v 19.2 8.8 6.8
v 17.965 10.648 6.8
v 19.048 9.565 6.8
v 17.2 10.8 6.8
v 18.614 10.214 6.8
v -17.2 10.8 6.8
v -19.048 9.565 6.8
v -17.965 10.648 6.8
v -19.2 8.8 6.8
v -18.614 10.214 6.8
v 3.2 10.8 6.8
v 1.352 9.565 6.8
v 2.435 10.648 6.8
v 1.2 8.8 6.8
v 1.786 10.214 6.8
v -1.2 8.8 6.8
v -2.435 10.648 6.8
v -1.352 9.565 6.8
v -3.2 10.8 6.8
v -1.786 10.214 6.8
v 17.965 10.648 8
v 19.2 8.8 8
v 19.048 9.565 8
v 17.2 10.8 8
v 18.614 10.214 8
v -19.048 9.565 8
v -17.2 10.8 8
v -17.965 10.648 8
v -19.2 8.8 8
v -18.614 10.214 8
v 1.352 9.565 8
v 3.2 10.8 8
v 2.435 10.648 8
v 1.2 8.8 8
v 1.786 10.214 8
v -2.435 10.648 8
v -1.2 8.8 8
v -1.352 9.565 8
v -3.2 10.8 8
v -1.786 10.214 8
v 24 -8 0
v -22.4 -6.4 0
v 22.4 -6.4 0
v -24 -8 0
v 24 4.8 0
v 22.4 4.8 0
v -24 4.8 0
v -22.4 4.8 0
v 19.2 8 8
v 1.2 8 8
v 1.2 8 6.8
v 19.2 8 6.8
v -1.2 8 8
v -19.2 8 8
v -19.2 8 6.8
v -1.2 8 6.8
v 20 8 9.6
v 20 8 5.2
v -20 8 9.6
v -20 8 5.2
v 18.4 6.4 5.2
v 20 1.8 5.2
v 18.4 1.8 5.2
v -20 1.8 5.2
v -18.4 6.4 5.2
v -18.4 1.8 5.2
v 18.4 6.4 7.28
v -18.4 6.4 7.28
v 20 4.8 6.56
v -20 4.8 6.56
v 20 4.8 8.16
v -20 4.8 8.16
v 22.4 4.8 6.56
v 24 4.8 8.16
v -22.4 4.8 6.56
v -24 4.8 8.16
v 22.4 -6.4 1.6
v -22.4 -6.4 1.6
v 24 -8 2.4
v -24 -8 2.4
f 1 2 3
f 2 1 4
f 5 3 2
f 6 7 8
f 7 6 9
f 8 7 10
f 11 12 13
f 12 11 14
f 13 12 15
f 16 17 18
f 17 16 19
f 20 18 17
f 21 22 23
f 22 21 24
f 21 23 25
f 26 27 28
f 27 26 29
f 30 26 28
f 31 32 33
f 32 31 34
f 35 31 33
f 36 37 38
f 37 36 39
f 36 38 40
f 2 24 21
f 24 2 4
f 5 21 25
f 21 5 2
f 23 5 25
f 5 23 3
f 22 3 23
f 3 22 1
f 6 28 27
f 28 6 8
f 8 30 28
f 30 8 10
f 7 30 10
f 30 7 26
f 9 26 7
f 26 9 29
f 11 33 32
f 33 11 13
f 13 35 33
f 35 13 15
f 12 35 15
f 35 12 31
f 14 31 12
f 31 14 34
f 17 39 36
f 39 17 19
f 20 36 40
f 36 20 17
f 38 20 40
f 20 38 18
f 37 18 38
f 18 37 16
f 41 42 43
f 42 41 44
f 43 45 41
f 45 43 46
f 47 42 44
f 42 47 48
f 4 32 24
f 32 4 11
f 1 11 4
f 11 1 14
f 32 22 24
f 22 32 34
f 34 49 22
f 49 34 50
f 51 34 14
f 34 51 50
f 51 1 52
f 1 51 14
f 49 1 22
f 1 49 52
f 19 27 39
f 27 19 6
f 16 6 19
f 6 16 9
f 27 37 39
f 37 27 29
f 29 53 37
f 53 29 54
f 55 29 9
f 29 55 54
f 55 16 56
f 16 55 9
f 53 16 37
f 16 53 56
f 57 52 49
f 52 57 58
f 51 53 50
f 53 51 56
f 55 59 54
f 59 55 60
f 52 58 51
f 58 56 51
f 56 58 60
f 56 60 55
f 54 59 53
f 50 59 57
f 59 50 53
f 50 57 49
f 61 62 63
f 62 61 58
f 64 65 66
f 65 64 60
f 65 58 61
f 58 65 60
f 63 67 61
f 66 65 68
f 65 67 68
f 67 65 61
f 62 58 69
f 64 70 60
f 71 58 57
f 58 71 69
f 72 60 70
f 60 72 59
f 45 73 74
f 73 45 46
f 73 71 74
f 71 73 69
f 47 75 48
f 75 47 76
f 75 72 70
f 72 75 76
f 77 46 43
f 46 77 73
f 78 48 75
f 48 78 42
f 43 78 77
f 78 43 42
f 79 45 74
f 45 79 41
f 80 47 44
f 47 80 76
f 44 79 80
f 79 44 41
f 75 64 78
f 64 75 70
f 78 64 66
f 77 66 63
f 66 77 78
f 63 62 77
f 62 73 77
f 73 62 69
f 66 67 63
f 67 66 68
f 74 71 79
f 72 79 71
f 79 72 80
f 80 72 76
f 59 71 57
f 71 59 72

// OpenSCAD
// file: ../p/1-4edge.scad
use <../lib.scad>
function ldraw_lib__1_4edge() = [
// 0 Circle 0.25
// 0 Name: 1-4edge.dat
// 0 Author: James Jessiman
// 0 !LDRAW_ORG Primitive UPDATE 2017-01
// 0 !LICENSE Licensed under CC BY 2.0 and CC BY 4.0 : see CAreadme.txt
// 
// 0 BFC CERTIFY CCW
  [0,"BFC","CERTIFY"],
  [0,"BFC","CCW"],
// 
// 0 !HISTORY 2007-06-22 [PTadmin] Header formatted for Contributor Agreement
// 0 !HISTORY 2008-07-01 [PTadmin] Official Update 2008-01
// 0 !HISTORY 2017-01-15 [Steffen] BFCed
// 0 !HISTORY 2017-12-30 [PTadmin] Official Update 2017-01
// 
// 
// 2 24 1 0 0 0.9239 0 0.3827
  [2,24,1,0,0,0.9239,0,0.3827],
// 2 24 0.9239 0 0.3827 0.7071 0 0.7071
  [2,24,0.9239,0,0.3827,0.7071,0,0.7071],
// 2 24 0.7071 0 0.7071 0.3827 0 0.9239
  [2,24,0.7071,0,0.7071,0.3827,0,0.9239],
// 2 24 0.3827 0 0.9239 0 0 1
  [2,24,0.3827,0,0.9239,0,0,1],
];
module ldraw_lib__1_4edge(step=0, col=false, unit=2/5, alt=false, line=0.2, solid=!$preview)
    makepoly(ldraw_lib__1_4edge(), step=step, col=col, unit=unit, alt=alt, line=line, solid=solid);
ldraw_lib__1_4edge(line=0.2);
// file: ../p/1-4cyli.scad
use <../lib.scad>
function ldraw_lib__1_4cyli() = [
// 0 Cylinder 0.25
// 0 Name: 1-4cyli.dat
// 0 Author: James Jessiman
// 0 !LDRAW_ORG Primitive UPDATE 2012-01
// 0 !LICENSE Licensed under CC BY 2.0 and CC BY 4.0 : see CAreadme.txt
// 
// 0 BFC CERTIFY CCW
  [0,"BFC","CERTIFY"],
  [0,"BFC","CCW"],
// 
// 0 !HISTORY 2002-03-23 [sbliss] Added BFC statement.
// 0 !HISTORY 2002-04-25 [PTadmin] Official Update 2002-02
// 0 !HISTORY 2007-06-22 [PTadmin] Header formatted for Contributor Agreement
// 0 !HISTORY 2008-07-01 [PTadmin] Official Update 2008-01
// 0 !HISTORY 2012-02-16 [Philo] Changed to CCW
// 0 !HISTORY 2012-03-30 [PTadmin] Official Update 2012-01
// 
// 
// 4 16 1 1 0 0.9239 1 0.3827 0.9239 0 0.3827 1 0 0
  [4,16,1,1,0,0.9239,1,0.3827,0.9239,0,0.3827,1,0,0],
// 5 24 1 0 0 1 1 0 0.9239 0 0.3827 1 0 -1
  [5,24,1,0,0,1,1,0,0.9239,0,0.3827,1,0,-1],
// 4 16 0.9239 1 0.3827 0.7071 1 0.7071 0.7071 0 0.7071 0.9239 0 0.3827
  [4,16,0.9239,1,0.3827,0.7071,1,0.7071,0.7071,0,0.7071,0.9239,0,0.3827],
// 5 24 0.9239 0 0.3827 0.9239 1 0.3827 0.7071 0 0.7071 1 0 0
  [5,24,0.9239,0,0.3827,0.9239,1,0.3827,0.7071,0,0.7071,1,0,0],
// 4 16 0.7071 1 0.7071 0.3827 1 0.9239 0.3827 0 0.9239 0.7071 0 0.7071
  [4,16,0.7071,1,0.7071,0.3827,1,0.9239,0.3827,0,0.9239,0.7071,0,0.7071],
// 5 24 0.7071 0 0.7071 0.7071 1 0.7071 0.3827 0 0.9239 0.9239 0 0.3827
  [5,24,0.7071,0,0.7071,0.7071,1,0.7071,0.3827,0,0.9239,0.9239,0,0.3827],
// 4 16 0.3827 1 0.9239 0 1 1 0 0 1 0.3827 0 0.9239
  [4,16,0.3827,1,0.9239,0,1,1,0,0,1,0.3827,0,0.9239],
// 5 24 0.3827 0 0.9239 0.3827 1 0.9239 0 0 1 0.7071 0 0.7071
  [5,24,0.3827,0,0.9239,0.3827,1,0.9239,0,0,1,0.7071,0,0.7071],
// 5 24 0 0 1 0 1 1 0.3827 0 0.9239 -1 0 1
  [5,24,0,0,1,0,1,1,0.3827,0,0.9239,-1,0,1],
];
module ldraw_lib__1_4cyli(step=0, col=false, unit=2/5, alt=false, line=0.2, solid=!$preview)
    makepoly(ldraw_lib__1_4cyli(), step=step, col=col, unit=unit, alt=alt, line=line, solid=solid);
ldraw_lib__1_4cyli(line=0.2);
// file: ../p/rect2p.scad
use <../lib.scad>
function ldraw_lib__rect2p() = [
// 0 Rectangle with 2 Parallel Edges
// 0 Name: rect2p.dat
// 0 Author: Donald Sutter [technog]
// 0 !LDRAW_ORG Primitive UPDATE 2010-01
// 0 !LICENSE Licensed under CC BY 2.0 and CC BY 4.0 : see CAreadme.txt
// 
// 0 BFC CERTIFY CCW
  [0,"BFC","CERTIFY"],
  [0,"BFC","CCW"],
// 
// 0 !HISTORY 2003-08-01 [PTadmin] Official Update 2003-02
// 0 !HISTORY 2007-06-24 [PTadmin] Header formatted for Contributor Agreement
// 0 !HISTORY 2008-07-01 [PTadmin] Official Update 2008-01
// 0 !HISTORY 2010-01-17 [mikeheide] changed winding to CCW
// 0 !HISTORY 2010-04-05 [PTadmin] Official Update 2010-01
// 
// 
// 2 24 1 0 1 -1 0 1
  [2,24,1,0,1,-1,0,1],
// 2 24 -1 0 -1 1 0 -1
  [2,24,-1,0,-1,1,0,-1],
// 4 16 -1 0 1 -1 0 -1 1 0 -1 1 0 1
  [4,16,-1,0,1,-1,0,-1,1,0,-1,1,0,1],
// 0
];
module ldraw_lib__rect2p(step=0, col=false, unit=2/5, alt=false, line=0.2, solid=!$preview)
    makepoly(ldraw_lib__rect2p(), step=step, col=col, unit=unit, alt=alt, line=line, solid=solid);
ldraw_lib__rect2p(line=0.2);
// file: ../p/rect.scad
use <../lib.scad>
function ldraw_lib__rect() = [
// 0 Rectangle
// 0 Name: rect.dat
// 0 Author: James Jessiman
// 0 !LDRAW_ORG Primitive UPDATE 2010-01
// 0 !LICENSE Licensed under CC BY 2.0 and CC BY 4.0 : see CAreadme.txt
// 
// 0 BFC CERTIFY CCW
  [0,"BFC","CERTIFY"],
  [0,"BFC","CCW"],
// 
// 0 !HISTORY 2002-04-05 [hafhead] Added BFC statement
// 0 !HISTORY 2002-04-25 [PTadmin] Official Update 2002-02
// 0 !HISTORY 2007-06-24 [PTadmin] Header formatted for Contributor Agreement
// 0 !HISTORY 2008-07-01 [PTadmin] Official Update 2008-01
// 0 !HISTORY 2010-01-17 [mikeheide] changed winding to CCW
// 0 !HISTORY 2010-04-05 [PTadmin] Official Update 2010-01
// 
// 
// 2 24 1 0 1 -1 0 1
  [2,24,1,0,1,-1,0,1],
// 2 24 -1 0 1 -1 0 -1
  [2,24,-1,0,1,-1,0,-1],
// 2 24 -1 0 -1 1 0 -1
  [2,24,-1,0,-1,1,0,-1],
// 2 24 1 0 -1 1 0 1
  [2,24,1,0,-1,1,0,1],
// 4 16 -1 0 1 -1 0 -1 1 0 -1 1 0 1
  [4,16,-1,0,1,-1,0,-1,1,0,-1,1,0,1],
// 0
];
module ldraw_lib__rect(step=0, col=false, unit=2/5, alt=false, line=0.2, solid=!$preview)
    makepoly(ldraw_lib__rect(), step=step, col=col, unit=unit, alt=alt, line=line, solid=solid);
ldraw_lib__rect(line=0.2);
// file: ../p/box4o4a.scad
use <../lib.scad>
function ldraw_lib__box4o4a() = [
// 0 Box with 4 Faces (2 Parallel Pairs) without Bottom Edges
// 0 Name: box4o4a.dat
// 0 Author: Donald Sutter [technog]
// 0 !LDRAW_ORG Primitive UPDATE 2012-01
// 0 !LICENSE Licensed under CC BY 2.0 and CC BY 4.0 : see CAreadme.txt
// 
// 0 BFC CERTIFY CCW
  [0,"BFC","CERTIFY"],
  [0,"BFC","CCW"],
// 
// 0 !HISTORY 2003-08-01 [PTadmin] Official Update 2003-02
// 0 !HISTORY 2007-06-24 [PTadmin] Header formatted for Contributor Agreement
// 0 !HISTORY 2008-07-01 [PTadmin] Official Update 2008-01
// 0 !HISTORY 2012-02-16 [Philo] Changed to CCW
// 0 !HISTORY 2012-03-30 [PTadmin] Official Update 2012-01
// 
// 
// 2 24 1 0 1 -1 0 1
  [2,24,1,0,1,-1,0,1],
// 2 24 -1 0 1 -1 0 -1
  [2,24,-1,0,1,-1,0,-1],
// 2 24 -1 0 -1 1 0 -1
  [2,24,-1,0,-1,1,0,-1],
// 2 24 1 0 -1 1 0 1
  [2,24,1,0,-1,1,0,1],
// 2 24 1 0 1 1 1 1
  [2,24,1,0,1,1,1,1],
// 2 24 -1 0 1 -1 1 1
  [2,24,-1,0,1,-1,1,1],
// 2 24 1 0 -1 1 1 -1
  [2,24,1,0,-1,1,1,-1],
// 2 24 -1 0 -1 -1 1 -1
  [2,24,-1,0,-1,-1,1,-1],
// 4 16 -1 1 1 -1 0 1 1 0 1 1 1 1
  [4,16,-1,1,1,-1,0,1,1,0,1,1,1,1],
// 4 16 -1 1 -1 -1 0 -1 -1 0 1 -1 1 1
  [4,16,-1,1,-1,-1,0,-1,-1,0,1,-1,1,1],
// 4 16 1 1 -1 1 0 -1 -1 0 -1 -1 1 -1
  [4,16,1,1,-1,1,0,-1,-1,0,-1,-1,1,-1],
// 4 16 1 1 1 1 0 1 1 0 -1 1 1 -1
  [4,16,1,1,1,1,0,1,1,0,-1,1,1,-1],
];
module ldraw_lib__box4o4a(step=0, col=false, unit=2/5, alt=false, line=0.2, solid=!$preview)
    makepoly(ldraw_lib__box4o4a(), step=step, col=col, unit=unit, alt=alt, line=line, solid=solid);
ldraw_lib__box4o4a(line=0.2);
// file: ../p/1-4cylo.scad
use <../lib.scad>
use <1-4cyli.scad>
use <1-4edge.scad>
function ldraw_lib__1_4cylo() = [
// 0 Cylinder Open 0.25
// 0 Name: 1-4cylo.dat
// 0 Author: Max Martin Richter [MMR1988]
// 0 !LDRAW_ORG Primitive UPDATE 2010-03
// 0 !LICENSE Licensed under CC BY 2.0 and CC BY 4.0 : see CAreadme.txt
// 
// 0 BFC CERTIFY CCW
  [0,"BFC","CERTIFY"],
  [0,"BFC","CCW"],
// 
// 0 !HISTORY 2010-12-31 [PTadmin] Official Update 2010-03
// 
// 
// 1 16 0 0 0 1 0 0 0 1 0 0 0 1 1-4edge.dat
  [1,16,0,0,0,1,0,0,0,1,0,0,0,1, ldraw_lib__1_4edge()],
// 1 16 0 1 0 1 0 0 0 1 0 0 0 1 1-4edge.dat
  [1,16,0,1,0,1,0,0,0,1,0,0,0,1, ldraw_lib__1_4edge()],
// 1 16 0 0 0 1 0 0 0 1 0 0 0 1 1-4cyli.dat
  [1,16,0,0,0,1,0,0,0,1,0,0,0,1, ldraw_lib__1_4cyli()],
];
module ldraw_lib__1_4cylo(step=0, col=false, unit=2/5, alt=false, line=0.2, solid=!$preview)
    makepoly(ldraw_lib__1_4cylo(), step=step, col=col, unit=unit, alt=alt, line=line, solid=solid);
ldraw_lib__1_4cylo(line=0.2);
// file: ../p/1-4chrd.scad
use <../lib.scad>
function ldraw_lib__1_4chrd() = [
// 0 Chord 0.25
// 0 Name: 1-4chrd.dat
// 0 Author: Tony Hafner [hafhead]
// 0 !LDRAW_ORG Primitive UPDATE 2012-02
// 0 !LICENSE Licensed under CC BY 2.0 and CC BY 4.0 : see CAreadme.txt
// 
// 0 BFC CERTIFY CCW
  [0,"BFC","CERTIFY"],
  [0,"BFC","CCW"],
// 
// 0 !HISTORY 2004-04-22 [PTadmin] Official Update 2004-02
// 0 !HISTORY 2007-10-09 [PTadmin] Header formatted for Contributor Agreement
// 0 !HISTORY 2008-07-01 [PTadmin] Official Update 2008-01
// 0 !HISTORY 2012-08-02 [MMR1988] Re-creation with PrimGen2 and Rectifier
// 0 !HISTORY 2012-08-09 [PTadmin] Official Update 2012-02
// 
// 
// 4 16 0.9239 0 0.3827 0.3827 0 0.9239 0 0 1 1 0 0
  [4,16,0.9239,0,0.3827,0.3827,0,0.9239,0,0,1,1,0,0],
// 3 16 0.7071 0 0.7071 0.3827 0 0.9239 0.9239 0 0.3827
  [3,16,0.7071,0,0.7071,0.3827,0,0.9239,0.9239,0,0.3827],
];
module ldraw_lib__1_4chrd(step=0, col=false, unit=2/5, alt=false, line=0.2, solid=!$preview)
    makepoly(ldraw_lib__1_4chrd(), step=step, col=col, unit=unit, alt=alt, line=line, solid=solid);
ldraw_lib__1_4chrd(line=0.2);
// main file
use <../lib.scad>
use <../p/1-4chrd.scad>
use <../p/1-4cylo.scad>
use <../p/box4o4a.scad>
use <../p/rect.scad>
use <../p/rect2p.scad>
function ldraw_lib__678() = [
// 0 Slope Homemaker Awning  2 x  6
// 0 Name: 678.dat
// 0 Author: Arne Hackstein
// 0 !LDRAW_ORG Part UPDATE 2015-01
// 0 !LICENSE Licensed under CC BY 2.0 and CC BY 4.0 : see CAreadme.txt
// 
// 0 BFC CERTIFY CCW
  [0,"BFC","CERTIFY"],
  [0,"BFC","CCW"],
// 
// 0 !HISTORY 1998-07-15 [PTadmin] Official Update 1998-07
// 0 !HISTORY 2007-07-18 [PTadmin] Header formatted for Contributor Agreement
// 0 !HISTORY 2008-07-01 [PTadmin] Official Update 2008-01
// 0 !HISTORY 2014-11-21 [roland] Auto-corrected with libfix version of LDCad 1.4
// 0 !HISTORY 2015-01-28 [Steffen] BFCed, rectified, retitled
// 0 !HISTORY 2015-02-05 [MagFors] Removed T-junctions
// 0 !HISTORY 2015-10-11 [PTadmin] Official Update 2015-01
// 
// 
// 2 24 60 0 -20 60 0 12
  [2,24,60,0,-20,60,0,12],
// 2 24 60 0 12 56 0 12
  [2,24,60,0,12,56,0,12],
// 2 24 56 0 12 56 0 -16
  [2,24,56,0,12,56,0,-16],
// 2 24 -56 0 -16 -56 0 12
  [2,24,-56,0,-16,-56,0,12],
// 2 24 -56 0 12 -60 0 12
  [2,24,-56,0,12,-60,0,12],
// 2 24 -60 0 12 -60 0 -20
  [2,24,-60,0,12,-60,0,-20],
// 2 24 60 0 12 60 -20.4 12
  [2,24,60,0,12,60,-20.4,12],
// 2 24 -60 0 12 -60 -20.4 12
  [2,24,-60,0,12,-60,-20.4,12],
// 2 24 56 -4 -16 56 -16.4 12
  [2,24,56,-4,-16,56,-16.4,12],
// 2 24 -56 -4 -16 -56 -16.4 12
  [2,24,-56,-4,-16,-56,-16.4,12],
// 2 24 56 0 12 56 -16.4 12
  [2,24,56,0,12,56,-16.4,12],
// 2 24 -56 0 12 -56 -16.4 12
  [2,24,-56,0,12,-56,-16.4,12],
// 2 24 50 -13 20 50 -24 20
  [2,24,50,-13,20,50,-24,20],
// 2 24 -50 -13 20 -50 -24 20
  [2,24,-50,-13,20,-50,-24,20],
// 2 24 50 -13 4.5 50 -13 20
  [2,24,50,-13,4.5,50,-13,20],
// 2 24 50 -13 4.5 46 -13 4.5
  [2,24,50,-13,4.5,46,-13,4.5],
// 2 24 46 -13 4.5 46 -13 16
  [2,24,46,-13,4.5,46,-13,16],
// 2 24 -50 -13 4.5 -50 -13 20
  [2,24,-50,-13,4.5,-50,-13,20],
// 2 24 -50 -13 4.5 -46 -13 4.5
  [2,24,-50,-13,4.5,-46,-13,4.5],
// 2 24 -46 -13 4.5 -46 -13 16
  [2,24,-46,-13,4.5,-46,-13,16],
// 2 24 60 -20.4 12 50 -20.4 12
  [2,24,60,-20.4,12,50,-20.4,12],
// 2 24 -60 -20.4 12 -50 -20.4 12
  [2,24,-60,-20.4,12,-50,-20.4,12],
// 2 24 50 -16.4 12 50 -20.4 12
  [2,24,50,-16.4,12,50,-20.4,12],
// 2 24 -50 -16.4 12 -50 -20.4 12
  [2,24,-50,-16.4,12,-50,-20.4,12],
// 2 24 50 -13 20 -50 -13 20
  [2,24,50,-13,20,-50,-13,20],
// 2 24 -50 -24 20 50 -24 20
  [2,24,-50,-24,20,50,-24,20],
// 2 24 -50 -16.4 12 -50 -13 4.5
  [2,24,-50,-16.4,12,-50,-13,4.5],
// 2 24 -56 -16.4 12 -50 -16.4 12
  [2,24,-56,-16.4,12,-50,-16.4,12],
// 2 24 50 -16.4 12 56 -16.4 12
  [2,24,50,-16.4,12,56,-16.4,12],
// 2 24 50 -13 4.5 50 -16.4 12
  [2,24,50,-13,4.5,50,-16.4,12],
// 2 24 -60 -20.4 12 -60 -6 -20
  [2,24,-60,-20.4,12,-60,-6,-20],
// 2 24 60 -6 -20 60 -20.4 12
  [2,24,60,-6,-20,60,-20.4,12],
// 1 16 43 -17 22 0 0 5 0 -1 0 5 0 0 1-4chrd.dat
  [1,16,43,-17,22,0,0,5,0,-1,0,5,0,0, ldraw_lib__1_4chrd()],
// 1 16 -43 -17 22 0 0 -5 0 -1 0 5 0 0 1-4chrd.dat
  [1,16,-43,-17,22,0,0,-5,0,-1,0,5,0,0, ldraw_lib__1_4chrd()],
// 1 16 8 -17 22 0 0 -5 0 -1 0 5 0 0 1-4chrd.dat
  [1,16,8,-17,22,0,0,-5,0,-1,0,5,0,0, ldraw_lib__1_4chrd()],
// 1 16 -8 -17 22 0 0 5 0 -1 0 5 0 0 1-4chrd.dat
  [1,16,-8,-17,22,0,0,5,0,-1,0,5,0,0, ldraw_lib__1_4chrd()],
// 1 16 43 -20 22 0 0 5 0 1 0 5 0 0 1-4chrd.dat
  [1,16,43,-20,22,0,0,5,0,1,0,5,0,0, ldraw_lib__1_4chrd()],
// 1 16 -43 -20 22 0 0 -5 0 1 0 5 0 0 1-4chrd.dat
  [1,16,-43,-20,22,0,0,-5,0,1,0,5,0,0, ldraw_lib__1_4chrd()],
// 1 16 8 -20 22 0 0 -5 0 1 0 5 0 0 1-4chrd.dat
  [1,16,8,-20,22,0,0,-5,0,1,0,5,0,0, ldraw_lib__1_4chrd()],
// 1 16 -8 -20 22 0 0 5 0 1 0 5 0 0 1-4chrd.dat
  [1,16,-8,-20,22,0,0,5,0,1,0,5,0,0, ldraw_lib__1_4chrd()],
// 1 16 43 -17 22 0 0 5 0 -3 0 5 0 0 1-4cylo.dat
  [1,16,43,-17,22,0,0,5,0,-3,0,5,0,0, ldraw_lib__1_4cylo()],
// 1 16 -43 -17 22 0 0 -5 0 -3 0 5 0 0 1-4cylo.dat
  [1,16,-43,-17,22,0,0,-5,0,-3,0,5,0,0, ldraw_lib__1_4cylo()],
// 1 16 8 -17 22 0 0 -5 0 -3 0 5 0 0 1-4cylo.dat
  [1,16,8,-17,22,0,0,-5,0,-3,0,5,0,0, ldraw_lib__1_4cylo()],
// 1 16 -8 -17 22 0 0 5 0 -3 0 5 0 0 1-4cylo.dat
  [1,16,-8,-17,22,0,0,5,0,-3,0,5,0,0, ldraw_lib__1_4cylo()],
// 4 16 60 0 -20 -60 0 -20 -56 0 -16 56 0 -16
  [4,16,60,0,-20,-60,0,-20,-56,0,-16,56,0,-16],
// 4 16 60 0 -20 56 0 -16 56 0 12 60 0 12
  [4,16,60,0,-20,56,0,-16,56,0,12,60,0,12],
// 4 16 -60 0 -20 -60 0 12 -56 0 12 -56 0 -16
  [4,16,-60,0,-20,-60,0,12,-56,0,12,-56,0,-16],
// 1 16 25.5 -18.5 27 -17.5 0 0 0 0 -1.5 0 -1 0 rect2p.dat
  [1,16,25.5,-18.5,27,-17.5,0,0,0,0,-1.5,0,-1,0, ldraw_lib__rect2p()],
// 4 16 43 -17 27 48 -17 22 3 -17 22 8 -17 27
  [4,16,43,-17,27,48,-17,22,3,-17,22,8,-17,27],
// 4 16 43 -20 27 8 -20 27 3 -20 22 48 -20 22
  [4,16,43,-20,27,8,-20,27,3,-20,22,48,-20,22],
// 1 16 25.5 -18.5 20 22.5 0 0 0 0 -1.5 0 2 0 box4o4a.dat
  [1,16,25.5,-18.5,20,22.5,0,0,0,0,-1.5,0,2,0, ldraw_lib__box4o4a()],
// 1 16 -25.5 -18.5 27 17.5 0 0 0 0 1.5 0 -1 0 rect2p.dat
  [1,16,-25.5,-18.5,27,17.5,0,0,0,0,1.5,0,-1,0, ldraw_lib__rect2p()],
// 4 16 -8 -17 27 -3 -17 22 -48 -17 22 -43 -17 27
  [4,16,-8,-17,27,-3,-17,22,-48,-17,22,-43,-17,27],
// 4 16 -48 -20 22 -3 -20 22 -8 -20 27 -43 -20 27
  [4,16,-48,-20,22,-3,-20,22,-8,-20,27,-43,-20,27],
// 1 16 -25.5 -18.5 20 22.5 0 0 0 0 -1.5 0 2 0 box4o4a.dat
  [1,16,-25.5,-18.5,20,22.5,0,0,0,0,-1.5,0,2,0, ldraw_lib__box4o4a()],
// 4 16 50 -13 20 48 -17 20 48 -20 20 50 -24 20
  [4,16,50,-13,20,48,-17,20,48,-20,20,50,-24,20],
// 4 16 3 -17 20 -3 -17 20 -3 -20 20 3 -20 20
  [4,16,3,-17,20,-3,-17,20,-3,-20,20,3,-20,20],
// 4 16 -50 -13 20 -50 -24 20 -48 -20 20 -48 -17 20
  [4,16,-50,-13,20,-50,-24,20,-48,-20,20,-48,-17,20],
// 3 16 48 -17 20 50 -13 20 3 -17 20
  [3,16,48,-17,20,50,-13,20,3,-17,20],
// 4 16 -3 -17 20 3 -17 20 50 -13 20 -50 -13 20
  [4,16,-3,-17,20,3,-17,20,50,-13,20,-50,-13,20],
// 3 16 -3 -17 20 -50 -13 20 -48 -17 20
  [3,16,-3,-17,20,-50,-13,20,-48,-17,20],
// 3 16 -48 -20 20 -50 -24 20 -3 -20 20
  [3,16,-48,-20,20,-50,-24,20,-3,-20,20],
// 4 16 3 -20 20 -3 -20 20 -50 -24 20 50 -24 20
  [4,16,3,-20,20,-3,-20,20,-50,-24,20,50,-24,20],
// 3 16 3 -20 20 50 -24 20 48 -20 20
  [3,16,3,-20,20,50,-24,20,48,-20,20],
// 4 16 50 -13 4.5 46 -13 4.5 46 -13 16 50 -13 20
  [4,16,50,-13,4.5,46,-13,4.5,46,-13,16,50,-13,20],
// 4 16 -50 -13 4.5 -50 -13 20 -46 -13 16 -46 -13 4.5
  [4,16,-50,-13,4.5,-50,-13,20,-46,-13,16,-46,-13,4.5],
// 4 16 50 -13 20 46 -13 16 -46 -13 16 -50 -13 20
  [4,16,50,-13,20,46,-13,16,-46,-13,16,-50,-13,20],
// 3 16 46 -13 4.5 46 -18.2 16 46 -13 16
  [3,16,46,-13,4.5,46,-18.2,16,46,-13,16],
// 3 16 -46 -13 4.5 -46 -13 16 -46 -18.2 16
  [3,16,-46,-13,4.5,-46,-13,16,-46,-18.2,16],
// 1 16 0 -15.6 16 0 0 -46 -2.6 0 0 0 1 0 rect.dat
  [1,16,0,-15.6,16,0,0,-46,-2.6,0,0,0,1,0, ldraw_lib__rect()],
// 3 16 50 -13 4.5 50 -13 20 50 -16.4 12
  [3,16,50,-13,4.5,50,-13,20,50,-16.4,12],
// 3 16 -50 -13 4.5 -50 -16.4 12 -50 -13 20
  [3,16,-50,-13,4.5,-50,-16.4,12,-50,-13,20],
// 4 16 50 -13 20 50 -24 20 50 -20.4 12 50 -16.4 12
  [4,16,50,-13,20,50,-24,20,50,-20.4,12,50,-16.4,12],
// 4 16 -50 -13 20 -50 -16.4 12 -50 -20.4 12 -50 -24 20
  [4,16,-50,-13,20,-50,-16.4,12,-50,-20.4,12,-50,-24,20],
// 4 16 60 0 12 56 0 12 56 -16.4 12 60 -20.4 12
  [4,16,60,0,12,56,0,12,56,-16.4,12,60,-20.4,12],
// 4 16 60 -20.4 12 56 -16.4 12 50 -16.4 12 50 -20.4 12
  [4,16,60,-20.4,12,56,-16.4,12,50,-16.4,12,50,-20.4,12],
// 4 16 -60 0 12 -60 -20.4 12 -56 -16.4 12 -56 0 12
  [4,16,-60,0,12,-60,-20.4,12,-56,-16.4,12,-56,0,12],
// 4 16 -60 -20.4 12 -50 -20.4 12 -50 -16.4 12 -56 -16.4 12
  [4,16,-60,-20.4,12,-50,-20.4,12,-50,-16.4,12,-56,-16.4,12],
// 4 16 56 0 -16 56 -4 -16 56 -16.4 12 56 0 12
  [4,16,56,0,-16,56,-4,-16,56,-16.4,12,56,0,12],
// 4 16 -56 0 -16 -56 0 12 -56 -16.4 12 -56 -4 -16
  [4,16,-56,0,-16,-56,0,12,-56,-16.4,12,-56,-4,-16],
// 1 16 0 -2 -16 -56 0 0 0 0 -2 0 -1 0 rect.dat
  [1,16,0,-2,-16,-56,0,0,0,0,-2,0,-1,0, ldraw_lib__rect()],
// 4 16 60 0 -20 60 0 12 60 -20.4 12 60 -6 -20
  [4,16,60,0,-20,60,0,12,60,-20.4,12,60,-6,-20],
// 4 16 -60 0 -20 -60 -6 -20 -60 -20.4 12 -60 0 12
  [4,16,-60,0,-20,-60,-6,-20,-60,-20.4,12,-60,0,12],
// 1 16 0 -3 -20 0 0 -60 -3 0 0 0 1 0 rect.dat
  [1,16,0,-3,-20,0,0,-60,-3,0,0,0,1,0, ldraw_lib__rect()],
// 4 16 -50 -13 4.5 -56 -4 -16 -56 -16.4 12 -50 -16.4 12
  [4,16,-50,-13,4.5,-56,-4,-16,-56,-16.4,12,-50,-16.4,12],
// 3 16 -56 -4 -16 -50 -13 4.5 -46 -13 4.5
  [3,16,-56,-4,-16,-50,-13,4.5,-46,-13,4.5],
// 4 16 56 -4 -16 -56 -4 -16 -46 -13 4.5 46 -13 4.5
  [4,16,56,-4,-16,-56,-4,-16,-46,-13,4.5,46,-13,4.5],
// 3 16 46 -13 4.5 50 -13 4.5 56 -4 -16
  [3,16,46,-13,4.5,50,-13,4.5,56,-4,-16],
// 4 16 50 -16.4 12 56 -16.4 12 56 -4 -16 50 -13 4.5
  [4,16,50,-16.4,12,56,-16.4,12,56,-4,-16,50,-13,4.5],
// 1 16 0 -15.6 10.25 0 0 46 -2.6 -529 0 5.75 -239.2 0 rect2p.dat
  [1,16,0,-15.6,10.25,0,0,46,-2.6,-529,0,5.75,-239.2,0, ldraw_lib__rect2p()],
// 3 16 60 -20.4 12 50 -20.4 12 60 -6 -20
  [3,16,60,-20.4,12,50,-20.4,12,60,-6,-20],
// 4 16 -60 -6 -20 60 -6 -20 50 -20.4 12 -50 -20.4 12
  [4,16,-60,-6,-20,60,-6,-20,50,-20.4,12,-50,-20.4,12],
// 3 16 -60 -6 -20 -50 -20.4 12 -60 -20.4 12
  [3,16,-60,-6,-20,-50,-20.4,12,-60,-20.4,12],
// 1 16 0 -22.2 16 0 0 -50 -1.8 20 0 4 9 0 rect2p.dat
  [1,16,0,-22.2,16,0,0,-50,-1.8,20,0,4,9,0, ldraw_lib__rect2p()],
];
module ldraw_lib__678(step=0, col=false, unit=2/5, alt=false, line=0.2, solid=!$preview)
    makepoly(ldraw_lib__678(), step=step, col=col, unit=unit, alt=alt, line=line, solid=solid);
ldraw_lib__678(line=0.2);
